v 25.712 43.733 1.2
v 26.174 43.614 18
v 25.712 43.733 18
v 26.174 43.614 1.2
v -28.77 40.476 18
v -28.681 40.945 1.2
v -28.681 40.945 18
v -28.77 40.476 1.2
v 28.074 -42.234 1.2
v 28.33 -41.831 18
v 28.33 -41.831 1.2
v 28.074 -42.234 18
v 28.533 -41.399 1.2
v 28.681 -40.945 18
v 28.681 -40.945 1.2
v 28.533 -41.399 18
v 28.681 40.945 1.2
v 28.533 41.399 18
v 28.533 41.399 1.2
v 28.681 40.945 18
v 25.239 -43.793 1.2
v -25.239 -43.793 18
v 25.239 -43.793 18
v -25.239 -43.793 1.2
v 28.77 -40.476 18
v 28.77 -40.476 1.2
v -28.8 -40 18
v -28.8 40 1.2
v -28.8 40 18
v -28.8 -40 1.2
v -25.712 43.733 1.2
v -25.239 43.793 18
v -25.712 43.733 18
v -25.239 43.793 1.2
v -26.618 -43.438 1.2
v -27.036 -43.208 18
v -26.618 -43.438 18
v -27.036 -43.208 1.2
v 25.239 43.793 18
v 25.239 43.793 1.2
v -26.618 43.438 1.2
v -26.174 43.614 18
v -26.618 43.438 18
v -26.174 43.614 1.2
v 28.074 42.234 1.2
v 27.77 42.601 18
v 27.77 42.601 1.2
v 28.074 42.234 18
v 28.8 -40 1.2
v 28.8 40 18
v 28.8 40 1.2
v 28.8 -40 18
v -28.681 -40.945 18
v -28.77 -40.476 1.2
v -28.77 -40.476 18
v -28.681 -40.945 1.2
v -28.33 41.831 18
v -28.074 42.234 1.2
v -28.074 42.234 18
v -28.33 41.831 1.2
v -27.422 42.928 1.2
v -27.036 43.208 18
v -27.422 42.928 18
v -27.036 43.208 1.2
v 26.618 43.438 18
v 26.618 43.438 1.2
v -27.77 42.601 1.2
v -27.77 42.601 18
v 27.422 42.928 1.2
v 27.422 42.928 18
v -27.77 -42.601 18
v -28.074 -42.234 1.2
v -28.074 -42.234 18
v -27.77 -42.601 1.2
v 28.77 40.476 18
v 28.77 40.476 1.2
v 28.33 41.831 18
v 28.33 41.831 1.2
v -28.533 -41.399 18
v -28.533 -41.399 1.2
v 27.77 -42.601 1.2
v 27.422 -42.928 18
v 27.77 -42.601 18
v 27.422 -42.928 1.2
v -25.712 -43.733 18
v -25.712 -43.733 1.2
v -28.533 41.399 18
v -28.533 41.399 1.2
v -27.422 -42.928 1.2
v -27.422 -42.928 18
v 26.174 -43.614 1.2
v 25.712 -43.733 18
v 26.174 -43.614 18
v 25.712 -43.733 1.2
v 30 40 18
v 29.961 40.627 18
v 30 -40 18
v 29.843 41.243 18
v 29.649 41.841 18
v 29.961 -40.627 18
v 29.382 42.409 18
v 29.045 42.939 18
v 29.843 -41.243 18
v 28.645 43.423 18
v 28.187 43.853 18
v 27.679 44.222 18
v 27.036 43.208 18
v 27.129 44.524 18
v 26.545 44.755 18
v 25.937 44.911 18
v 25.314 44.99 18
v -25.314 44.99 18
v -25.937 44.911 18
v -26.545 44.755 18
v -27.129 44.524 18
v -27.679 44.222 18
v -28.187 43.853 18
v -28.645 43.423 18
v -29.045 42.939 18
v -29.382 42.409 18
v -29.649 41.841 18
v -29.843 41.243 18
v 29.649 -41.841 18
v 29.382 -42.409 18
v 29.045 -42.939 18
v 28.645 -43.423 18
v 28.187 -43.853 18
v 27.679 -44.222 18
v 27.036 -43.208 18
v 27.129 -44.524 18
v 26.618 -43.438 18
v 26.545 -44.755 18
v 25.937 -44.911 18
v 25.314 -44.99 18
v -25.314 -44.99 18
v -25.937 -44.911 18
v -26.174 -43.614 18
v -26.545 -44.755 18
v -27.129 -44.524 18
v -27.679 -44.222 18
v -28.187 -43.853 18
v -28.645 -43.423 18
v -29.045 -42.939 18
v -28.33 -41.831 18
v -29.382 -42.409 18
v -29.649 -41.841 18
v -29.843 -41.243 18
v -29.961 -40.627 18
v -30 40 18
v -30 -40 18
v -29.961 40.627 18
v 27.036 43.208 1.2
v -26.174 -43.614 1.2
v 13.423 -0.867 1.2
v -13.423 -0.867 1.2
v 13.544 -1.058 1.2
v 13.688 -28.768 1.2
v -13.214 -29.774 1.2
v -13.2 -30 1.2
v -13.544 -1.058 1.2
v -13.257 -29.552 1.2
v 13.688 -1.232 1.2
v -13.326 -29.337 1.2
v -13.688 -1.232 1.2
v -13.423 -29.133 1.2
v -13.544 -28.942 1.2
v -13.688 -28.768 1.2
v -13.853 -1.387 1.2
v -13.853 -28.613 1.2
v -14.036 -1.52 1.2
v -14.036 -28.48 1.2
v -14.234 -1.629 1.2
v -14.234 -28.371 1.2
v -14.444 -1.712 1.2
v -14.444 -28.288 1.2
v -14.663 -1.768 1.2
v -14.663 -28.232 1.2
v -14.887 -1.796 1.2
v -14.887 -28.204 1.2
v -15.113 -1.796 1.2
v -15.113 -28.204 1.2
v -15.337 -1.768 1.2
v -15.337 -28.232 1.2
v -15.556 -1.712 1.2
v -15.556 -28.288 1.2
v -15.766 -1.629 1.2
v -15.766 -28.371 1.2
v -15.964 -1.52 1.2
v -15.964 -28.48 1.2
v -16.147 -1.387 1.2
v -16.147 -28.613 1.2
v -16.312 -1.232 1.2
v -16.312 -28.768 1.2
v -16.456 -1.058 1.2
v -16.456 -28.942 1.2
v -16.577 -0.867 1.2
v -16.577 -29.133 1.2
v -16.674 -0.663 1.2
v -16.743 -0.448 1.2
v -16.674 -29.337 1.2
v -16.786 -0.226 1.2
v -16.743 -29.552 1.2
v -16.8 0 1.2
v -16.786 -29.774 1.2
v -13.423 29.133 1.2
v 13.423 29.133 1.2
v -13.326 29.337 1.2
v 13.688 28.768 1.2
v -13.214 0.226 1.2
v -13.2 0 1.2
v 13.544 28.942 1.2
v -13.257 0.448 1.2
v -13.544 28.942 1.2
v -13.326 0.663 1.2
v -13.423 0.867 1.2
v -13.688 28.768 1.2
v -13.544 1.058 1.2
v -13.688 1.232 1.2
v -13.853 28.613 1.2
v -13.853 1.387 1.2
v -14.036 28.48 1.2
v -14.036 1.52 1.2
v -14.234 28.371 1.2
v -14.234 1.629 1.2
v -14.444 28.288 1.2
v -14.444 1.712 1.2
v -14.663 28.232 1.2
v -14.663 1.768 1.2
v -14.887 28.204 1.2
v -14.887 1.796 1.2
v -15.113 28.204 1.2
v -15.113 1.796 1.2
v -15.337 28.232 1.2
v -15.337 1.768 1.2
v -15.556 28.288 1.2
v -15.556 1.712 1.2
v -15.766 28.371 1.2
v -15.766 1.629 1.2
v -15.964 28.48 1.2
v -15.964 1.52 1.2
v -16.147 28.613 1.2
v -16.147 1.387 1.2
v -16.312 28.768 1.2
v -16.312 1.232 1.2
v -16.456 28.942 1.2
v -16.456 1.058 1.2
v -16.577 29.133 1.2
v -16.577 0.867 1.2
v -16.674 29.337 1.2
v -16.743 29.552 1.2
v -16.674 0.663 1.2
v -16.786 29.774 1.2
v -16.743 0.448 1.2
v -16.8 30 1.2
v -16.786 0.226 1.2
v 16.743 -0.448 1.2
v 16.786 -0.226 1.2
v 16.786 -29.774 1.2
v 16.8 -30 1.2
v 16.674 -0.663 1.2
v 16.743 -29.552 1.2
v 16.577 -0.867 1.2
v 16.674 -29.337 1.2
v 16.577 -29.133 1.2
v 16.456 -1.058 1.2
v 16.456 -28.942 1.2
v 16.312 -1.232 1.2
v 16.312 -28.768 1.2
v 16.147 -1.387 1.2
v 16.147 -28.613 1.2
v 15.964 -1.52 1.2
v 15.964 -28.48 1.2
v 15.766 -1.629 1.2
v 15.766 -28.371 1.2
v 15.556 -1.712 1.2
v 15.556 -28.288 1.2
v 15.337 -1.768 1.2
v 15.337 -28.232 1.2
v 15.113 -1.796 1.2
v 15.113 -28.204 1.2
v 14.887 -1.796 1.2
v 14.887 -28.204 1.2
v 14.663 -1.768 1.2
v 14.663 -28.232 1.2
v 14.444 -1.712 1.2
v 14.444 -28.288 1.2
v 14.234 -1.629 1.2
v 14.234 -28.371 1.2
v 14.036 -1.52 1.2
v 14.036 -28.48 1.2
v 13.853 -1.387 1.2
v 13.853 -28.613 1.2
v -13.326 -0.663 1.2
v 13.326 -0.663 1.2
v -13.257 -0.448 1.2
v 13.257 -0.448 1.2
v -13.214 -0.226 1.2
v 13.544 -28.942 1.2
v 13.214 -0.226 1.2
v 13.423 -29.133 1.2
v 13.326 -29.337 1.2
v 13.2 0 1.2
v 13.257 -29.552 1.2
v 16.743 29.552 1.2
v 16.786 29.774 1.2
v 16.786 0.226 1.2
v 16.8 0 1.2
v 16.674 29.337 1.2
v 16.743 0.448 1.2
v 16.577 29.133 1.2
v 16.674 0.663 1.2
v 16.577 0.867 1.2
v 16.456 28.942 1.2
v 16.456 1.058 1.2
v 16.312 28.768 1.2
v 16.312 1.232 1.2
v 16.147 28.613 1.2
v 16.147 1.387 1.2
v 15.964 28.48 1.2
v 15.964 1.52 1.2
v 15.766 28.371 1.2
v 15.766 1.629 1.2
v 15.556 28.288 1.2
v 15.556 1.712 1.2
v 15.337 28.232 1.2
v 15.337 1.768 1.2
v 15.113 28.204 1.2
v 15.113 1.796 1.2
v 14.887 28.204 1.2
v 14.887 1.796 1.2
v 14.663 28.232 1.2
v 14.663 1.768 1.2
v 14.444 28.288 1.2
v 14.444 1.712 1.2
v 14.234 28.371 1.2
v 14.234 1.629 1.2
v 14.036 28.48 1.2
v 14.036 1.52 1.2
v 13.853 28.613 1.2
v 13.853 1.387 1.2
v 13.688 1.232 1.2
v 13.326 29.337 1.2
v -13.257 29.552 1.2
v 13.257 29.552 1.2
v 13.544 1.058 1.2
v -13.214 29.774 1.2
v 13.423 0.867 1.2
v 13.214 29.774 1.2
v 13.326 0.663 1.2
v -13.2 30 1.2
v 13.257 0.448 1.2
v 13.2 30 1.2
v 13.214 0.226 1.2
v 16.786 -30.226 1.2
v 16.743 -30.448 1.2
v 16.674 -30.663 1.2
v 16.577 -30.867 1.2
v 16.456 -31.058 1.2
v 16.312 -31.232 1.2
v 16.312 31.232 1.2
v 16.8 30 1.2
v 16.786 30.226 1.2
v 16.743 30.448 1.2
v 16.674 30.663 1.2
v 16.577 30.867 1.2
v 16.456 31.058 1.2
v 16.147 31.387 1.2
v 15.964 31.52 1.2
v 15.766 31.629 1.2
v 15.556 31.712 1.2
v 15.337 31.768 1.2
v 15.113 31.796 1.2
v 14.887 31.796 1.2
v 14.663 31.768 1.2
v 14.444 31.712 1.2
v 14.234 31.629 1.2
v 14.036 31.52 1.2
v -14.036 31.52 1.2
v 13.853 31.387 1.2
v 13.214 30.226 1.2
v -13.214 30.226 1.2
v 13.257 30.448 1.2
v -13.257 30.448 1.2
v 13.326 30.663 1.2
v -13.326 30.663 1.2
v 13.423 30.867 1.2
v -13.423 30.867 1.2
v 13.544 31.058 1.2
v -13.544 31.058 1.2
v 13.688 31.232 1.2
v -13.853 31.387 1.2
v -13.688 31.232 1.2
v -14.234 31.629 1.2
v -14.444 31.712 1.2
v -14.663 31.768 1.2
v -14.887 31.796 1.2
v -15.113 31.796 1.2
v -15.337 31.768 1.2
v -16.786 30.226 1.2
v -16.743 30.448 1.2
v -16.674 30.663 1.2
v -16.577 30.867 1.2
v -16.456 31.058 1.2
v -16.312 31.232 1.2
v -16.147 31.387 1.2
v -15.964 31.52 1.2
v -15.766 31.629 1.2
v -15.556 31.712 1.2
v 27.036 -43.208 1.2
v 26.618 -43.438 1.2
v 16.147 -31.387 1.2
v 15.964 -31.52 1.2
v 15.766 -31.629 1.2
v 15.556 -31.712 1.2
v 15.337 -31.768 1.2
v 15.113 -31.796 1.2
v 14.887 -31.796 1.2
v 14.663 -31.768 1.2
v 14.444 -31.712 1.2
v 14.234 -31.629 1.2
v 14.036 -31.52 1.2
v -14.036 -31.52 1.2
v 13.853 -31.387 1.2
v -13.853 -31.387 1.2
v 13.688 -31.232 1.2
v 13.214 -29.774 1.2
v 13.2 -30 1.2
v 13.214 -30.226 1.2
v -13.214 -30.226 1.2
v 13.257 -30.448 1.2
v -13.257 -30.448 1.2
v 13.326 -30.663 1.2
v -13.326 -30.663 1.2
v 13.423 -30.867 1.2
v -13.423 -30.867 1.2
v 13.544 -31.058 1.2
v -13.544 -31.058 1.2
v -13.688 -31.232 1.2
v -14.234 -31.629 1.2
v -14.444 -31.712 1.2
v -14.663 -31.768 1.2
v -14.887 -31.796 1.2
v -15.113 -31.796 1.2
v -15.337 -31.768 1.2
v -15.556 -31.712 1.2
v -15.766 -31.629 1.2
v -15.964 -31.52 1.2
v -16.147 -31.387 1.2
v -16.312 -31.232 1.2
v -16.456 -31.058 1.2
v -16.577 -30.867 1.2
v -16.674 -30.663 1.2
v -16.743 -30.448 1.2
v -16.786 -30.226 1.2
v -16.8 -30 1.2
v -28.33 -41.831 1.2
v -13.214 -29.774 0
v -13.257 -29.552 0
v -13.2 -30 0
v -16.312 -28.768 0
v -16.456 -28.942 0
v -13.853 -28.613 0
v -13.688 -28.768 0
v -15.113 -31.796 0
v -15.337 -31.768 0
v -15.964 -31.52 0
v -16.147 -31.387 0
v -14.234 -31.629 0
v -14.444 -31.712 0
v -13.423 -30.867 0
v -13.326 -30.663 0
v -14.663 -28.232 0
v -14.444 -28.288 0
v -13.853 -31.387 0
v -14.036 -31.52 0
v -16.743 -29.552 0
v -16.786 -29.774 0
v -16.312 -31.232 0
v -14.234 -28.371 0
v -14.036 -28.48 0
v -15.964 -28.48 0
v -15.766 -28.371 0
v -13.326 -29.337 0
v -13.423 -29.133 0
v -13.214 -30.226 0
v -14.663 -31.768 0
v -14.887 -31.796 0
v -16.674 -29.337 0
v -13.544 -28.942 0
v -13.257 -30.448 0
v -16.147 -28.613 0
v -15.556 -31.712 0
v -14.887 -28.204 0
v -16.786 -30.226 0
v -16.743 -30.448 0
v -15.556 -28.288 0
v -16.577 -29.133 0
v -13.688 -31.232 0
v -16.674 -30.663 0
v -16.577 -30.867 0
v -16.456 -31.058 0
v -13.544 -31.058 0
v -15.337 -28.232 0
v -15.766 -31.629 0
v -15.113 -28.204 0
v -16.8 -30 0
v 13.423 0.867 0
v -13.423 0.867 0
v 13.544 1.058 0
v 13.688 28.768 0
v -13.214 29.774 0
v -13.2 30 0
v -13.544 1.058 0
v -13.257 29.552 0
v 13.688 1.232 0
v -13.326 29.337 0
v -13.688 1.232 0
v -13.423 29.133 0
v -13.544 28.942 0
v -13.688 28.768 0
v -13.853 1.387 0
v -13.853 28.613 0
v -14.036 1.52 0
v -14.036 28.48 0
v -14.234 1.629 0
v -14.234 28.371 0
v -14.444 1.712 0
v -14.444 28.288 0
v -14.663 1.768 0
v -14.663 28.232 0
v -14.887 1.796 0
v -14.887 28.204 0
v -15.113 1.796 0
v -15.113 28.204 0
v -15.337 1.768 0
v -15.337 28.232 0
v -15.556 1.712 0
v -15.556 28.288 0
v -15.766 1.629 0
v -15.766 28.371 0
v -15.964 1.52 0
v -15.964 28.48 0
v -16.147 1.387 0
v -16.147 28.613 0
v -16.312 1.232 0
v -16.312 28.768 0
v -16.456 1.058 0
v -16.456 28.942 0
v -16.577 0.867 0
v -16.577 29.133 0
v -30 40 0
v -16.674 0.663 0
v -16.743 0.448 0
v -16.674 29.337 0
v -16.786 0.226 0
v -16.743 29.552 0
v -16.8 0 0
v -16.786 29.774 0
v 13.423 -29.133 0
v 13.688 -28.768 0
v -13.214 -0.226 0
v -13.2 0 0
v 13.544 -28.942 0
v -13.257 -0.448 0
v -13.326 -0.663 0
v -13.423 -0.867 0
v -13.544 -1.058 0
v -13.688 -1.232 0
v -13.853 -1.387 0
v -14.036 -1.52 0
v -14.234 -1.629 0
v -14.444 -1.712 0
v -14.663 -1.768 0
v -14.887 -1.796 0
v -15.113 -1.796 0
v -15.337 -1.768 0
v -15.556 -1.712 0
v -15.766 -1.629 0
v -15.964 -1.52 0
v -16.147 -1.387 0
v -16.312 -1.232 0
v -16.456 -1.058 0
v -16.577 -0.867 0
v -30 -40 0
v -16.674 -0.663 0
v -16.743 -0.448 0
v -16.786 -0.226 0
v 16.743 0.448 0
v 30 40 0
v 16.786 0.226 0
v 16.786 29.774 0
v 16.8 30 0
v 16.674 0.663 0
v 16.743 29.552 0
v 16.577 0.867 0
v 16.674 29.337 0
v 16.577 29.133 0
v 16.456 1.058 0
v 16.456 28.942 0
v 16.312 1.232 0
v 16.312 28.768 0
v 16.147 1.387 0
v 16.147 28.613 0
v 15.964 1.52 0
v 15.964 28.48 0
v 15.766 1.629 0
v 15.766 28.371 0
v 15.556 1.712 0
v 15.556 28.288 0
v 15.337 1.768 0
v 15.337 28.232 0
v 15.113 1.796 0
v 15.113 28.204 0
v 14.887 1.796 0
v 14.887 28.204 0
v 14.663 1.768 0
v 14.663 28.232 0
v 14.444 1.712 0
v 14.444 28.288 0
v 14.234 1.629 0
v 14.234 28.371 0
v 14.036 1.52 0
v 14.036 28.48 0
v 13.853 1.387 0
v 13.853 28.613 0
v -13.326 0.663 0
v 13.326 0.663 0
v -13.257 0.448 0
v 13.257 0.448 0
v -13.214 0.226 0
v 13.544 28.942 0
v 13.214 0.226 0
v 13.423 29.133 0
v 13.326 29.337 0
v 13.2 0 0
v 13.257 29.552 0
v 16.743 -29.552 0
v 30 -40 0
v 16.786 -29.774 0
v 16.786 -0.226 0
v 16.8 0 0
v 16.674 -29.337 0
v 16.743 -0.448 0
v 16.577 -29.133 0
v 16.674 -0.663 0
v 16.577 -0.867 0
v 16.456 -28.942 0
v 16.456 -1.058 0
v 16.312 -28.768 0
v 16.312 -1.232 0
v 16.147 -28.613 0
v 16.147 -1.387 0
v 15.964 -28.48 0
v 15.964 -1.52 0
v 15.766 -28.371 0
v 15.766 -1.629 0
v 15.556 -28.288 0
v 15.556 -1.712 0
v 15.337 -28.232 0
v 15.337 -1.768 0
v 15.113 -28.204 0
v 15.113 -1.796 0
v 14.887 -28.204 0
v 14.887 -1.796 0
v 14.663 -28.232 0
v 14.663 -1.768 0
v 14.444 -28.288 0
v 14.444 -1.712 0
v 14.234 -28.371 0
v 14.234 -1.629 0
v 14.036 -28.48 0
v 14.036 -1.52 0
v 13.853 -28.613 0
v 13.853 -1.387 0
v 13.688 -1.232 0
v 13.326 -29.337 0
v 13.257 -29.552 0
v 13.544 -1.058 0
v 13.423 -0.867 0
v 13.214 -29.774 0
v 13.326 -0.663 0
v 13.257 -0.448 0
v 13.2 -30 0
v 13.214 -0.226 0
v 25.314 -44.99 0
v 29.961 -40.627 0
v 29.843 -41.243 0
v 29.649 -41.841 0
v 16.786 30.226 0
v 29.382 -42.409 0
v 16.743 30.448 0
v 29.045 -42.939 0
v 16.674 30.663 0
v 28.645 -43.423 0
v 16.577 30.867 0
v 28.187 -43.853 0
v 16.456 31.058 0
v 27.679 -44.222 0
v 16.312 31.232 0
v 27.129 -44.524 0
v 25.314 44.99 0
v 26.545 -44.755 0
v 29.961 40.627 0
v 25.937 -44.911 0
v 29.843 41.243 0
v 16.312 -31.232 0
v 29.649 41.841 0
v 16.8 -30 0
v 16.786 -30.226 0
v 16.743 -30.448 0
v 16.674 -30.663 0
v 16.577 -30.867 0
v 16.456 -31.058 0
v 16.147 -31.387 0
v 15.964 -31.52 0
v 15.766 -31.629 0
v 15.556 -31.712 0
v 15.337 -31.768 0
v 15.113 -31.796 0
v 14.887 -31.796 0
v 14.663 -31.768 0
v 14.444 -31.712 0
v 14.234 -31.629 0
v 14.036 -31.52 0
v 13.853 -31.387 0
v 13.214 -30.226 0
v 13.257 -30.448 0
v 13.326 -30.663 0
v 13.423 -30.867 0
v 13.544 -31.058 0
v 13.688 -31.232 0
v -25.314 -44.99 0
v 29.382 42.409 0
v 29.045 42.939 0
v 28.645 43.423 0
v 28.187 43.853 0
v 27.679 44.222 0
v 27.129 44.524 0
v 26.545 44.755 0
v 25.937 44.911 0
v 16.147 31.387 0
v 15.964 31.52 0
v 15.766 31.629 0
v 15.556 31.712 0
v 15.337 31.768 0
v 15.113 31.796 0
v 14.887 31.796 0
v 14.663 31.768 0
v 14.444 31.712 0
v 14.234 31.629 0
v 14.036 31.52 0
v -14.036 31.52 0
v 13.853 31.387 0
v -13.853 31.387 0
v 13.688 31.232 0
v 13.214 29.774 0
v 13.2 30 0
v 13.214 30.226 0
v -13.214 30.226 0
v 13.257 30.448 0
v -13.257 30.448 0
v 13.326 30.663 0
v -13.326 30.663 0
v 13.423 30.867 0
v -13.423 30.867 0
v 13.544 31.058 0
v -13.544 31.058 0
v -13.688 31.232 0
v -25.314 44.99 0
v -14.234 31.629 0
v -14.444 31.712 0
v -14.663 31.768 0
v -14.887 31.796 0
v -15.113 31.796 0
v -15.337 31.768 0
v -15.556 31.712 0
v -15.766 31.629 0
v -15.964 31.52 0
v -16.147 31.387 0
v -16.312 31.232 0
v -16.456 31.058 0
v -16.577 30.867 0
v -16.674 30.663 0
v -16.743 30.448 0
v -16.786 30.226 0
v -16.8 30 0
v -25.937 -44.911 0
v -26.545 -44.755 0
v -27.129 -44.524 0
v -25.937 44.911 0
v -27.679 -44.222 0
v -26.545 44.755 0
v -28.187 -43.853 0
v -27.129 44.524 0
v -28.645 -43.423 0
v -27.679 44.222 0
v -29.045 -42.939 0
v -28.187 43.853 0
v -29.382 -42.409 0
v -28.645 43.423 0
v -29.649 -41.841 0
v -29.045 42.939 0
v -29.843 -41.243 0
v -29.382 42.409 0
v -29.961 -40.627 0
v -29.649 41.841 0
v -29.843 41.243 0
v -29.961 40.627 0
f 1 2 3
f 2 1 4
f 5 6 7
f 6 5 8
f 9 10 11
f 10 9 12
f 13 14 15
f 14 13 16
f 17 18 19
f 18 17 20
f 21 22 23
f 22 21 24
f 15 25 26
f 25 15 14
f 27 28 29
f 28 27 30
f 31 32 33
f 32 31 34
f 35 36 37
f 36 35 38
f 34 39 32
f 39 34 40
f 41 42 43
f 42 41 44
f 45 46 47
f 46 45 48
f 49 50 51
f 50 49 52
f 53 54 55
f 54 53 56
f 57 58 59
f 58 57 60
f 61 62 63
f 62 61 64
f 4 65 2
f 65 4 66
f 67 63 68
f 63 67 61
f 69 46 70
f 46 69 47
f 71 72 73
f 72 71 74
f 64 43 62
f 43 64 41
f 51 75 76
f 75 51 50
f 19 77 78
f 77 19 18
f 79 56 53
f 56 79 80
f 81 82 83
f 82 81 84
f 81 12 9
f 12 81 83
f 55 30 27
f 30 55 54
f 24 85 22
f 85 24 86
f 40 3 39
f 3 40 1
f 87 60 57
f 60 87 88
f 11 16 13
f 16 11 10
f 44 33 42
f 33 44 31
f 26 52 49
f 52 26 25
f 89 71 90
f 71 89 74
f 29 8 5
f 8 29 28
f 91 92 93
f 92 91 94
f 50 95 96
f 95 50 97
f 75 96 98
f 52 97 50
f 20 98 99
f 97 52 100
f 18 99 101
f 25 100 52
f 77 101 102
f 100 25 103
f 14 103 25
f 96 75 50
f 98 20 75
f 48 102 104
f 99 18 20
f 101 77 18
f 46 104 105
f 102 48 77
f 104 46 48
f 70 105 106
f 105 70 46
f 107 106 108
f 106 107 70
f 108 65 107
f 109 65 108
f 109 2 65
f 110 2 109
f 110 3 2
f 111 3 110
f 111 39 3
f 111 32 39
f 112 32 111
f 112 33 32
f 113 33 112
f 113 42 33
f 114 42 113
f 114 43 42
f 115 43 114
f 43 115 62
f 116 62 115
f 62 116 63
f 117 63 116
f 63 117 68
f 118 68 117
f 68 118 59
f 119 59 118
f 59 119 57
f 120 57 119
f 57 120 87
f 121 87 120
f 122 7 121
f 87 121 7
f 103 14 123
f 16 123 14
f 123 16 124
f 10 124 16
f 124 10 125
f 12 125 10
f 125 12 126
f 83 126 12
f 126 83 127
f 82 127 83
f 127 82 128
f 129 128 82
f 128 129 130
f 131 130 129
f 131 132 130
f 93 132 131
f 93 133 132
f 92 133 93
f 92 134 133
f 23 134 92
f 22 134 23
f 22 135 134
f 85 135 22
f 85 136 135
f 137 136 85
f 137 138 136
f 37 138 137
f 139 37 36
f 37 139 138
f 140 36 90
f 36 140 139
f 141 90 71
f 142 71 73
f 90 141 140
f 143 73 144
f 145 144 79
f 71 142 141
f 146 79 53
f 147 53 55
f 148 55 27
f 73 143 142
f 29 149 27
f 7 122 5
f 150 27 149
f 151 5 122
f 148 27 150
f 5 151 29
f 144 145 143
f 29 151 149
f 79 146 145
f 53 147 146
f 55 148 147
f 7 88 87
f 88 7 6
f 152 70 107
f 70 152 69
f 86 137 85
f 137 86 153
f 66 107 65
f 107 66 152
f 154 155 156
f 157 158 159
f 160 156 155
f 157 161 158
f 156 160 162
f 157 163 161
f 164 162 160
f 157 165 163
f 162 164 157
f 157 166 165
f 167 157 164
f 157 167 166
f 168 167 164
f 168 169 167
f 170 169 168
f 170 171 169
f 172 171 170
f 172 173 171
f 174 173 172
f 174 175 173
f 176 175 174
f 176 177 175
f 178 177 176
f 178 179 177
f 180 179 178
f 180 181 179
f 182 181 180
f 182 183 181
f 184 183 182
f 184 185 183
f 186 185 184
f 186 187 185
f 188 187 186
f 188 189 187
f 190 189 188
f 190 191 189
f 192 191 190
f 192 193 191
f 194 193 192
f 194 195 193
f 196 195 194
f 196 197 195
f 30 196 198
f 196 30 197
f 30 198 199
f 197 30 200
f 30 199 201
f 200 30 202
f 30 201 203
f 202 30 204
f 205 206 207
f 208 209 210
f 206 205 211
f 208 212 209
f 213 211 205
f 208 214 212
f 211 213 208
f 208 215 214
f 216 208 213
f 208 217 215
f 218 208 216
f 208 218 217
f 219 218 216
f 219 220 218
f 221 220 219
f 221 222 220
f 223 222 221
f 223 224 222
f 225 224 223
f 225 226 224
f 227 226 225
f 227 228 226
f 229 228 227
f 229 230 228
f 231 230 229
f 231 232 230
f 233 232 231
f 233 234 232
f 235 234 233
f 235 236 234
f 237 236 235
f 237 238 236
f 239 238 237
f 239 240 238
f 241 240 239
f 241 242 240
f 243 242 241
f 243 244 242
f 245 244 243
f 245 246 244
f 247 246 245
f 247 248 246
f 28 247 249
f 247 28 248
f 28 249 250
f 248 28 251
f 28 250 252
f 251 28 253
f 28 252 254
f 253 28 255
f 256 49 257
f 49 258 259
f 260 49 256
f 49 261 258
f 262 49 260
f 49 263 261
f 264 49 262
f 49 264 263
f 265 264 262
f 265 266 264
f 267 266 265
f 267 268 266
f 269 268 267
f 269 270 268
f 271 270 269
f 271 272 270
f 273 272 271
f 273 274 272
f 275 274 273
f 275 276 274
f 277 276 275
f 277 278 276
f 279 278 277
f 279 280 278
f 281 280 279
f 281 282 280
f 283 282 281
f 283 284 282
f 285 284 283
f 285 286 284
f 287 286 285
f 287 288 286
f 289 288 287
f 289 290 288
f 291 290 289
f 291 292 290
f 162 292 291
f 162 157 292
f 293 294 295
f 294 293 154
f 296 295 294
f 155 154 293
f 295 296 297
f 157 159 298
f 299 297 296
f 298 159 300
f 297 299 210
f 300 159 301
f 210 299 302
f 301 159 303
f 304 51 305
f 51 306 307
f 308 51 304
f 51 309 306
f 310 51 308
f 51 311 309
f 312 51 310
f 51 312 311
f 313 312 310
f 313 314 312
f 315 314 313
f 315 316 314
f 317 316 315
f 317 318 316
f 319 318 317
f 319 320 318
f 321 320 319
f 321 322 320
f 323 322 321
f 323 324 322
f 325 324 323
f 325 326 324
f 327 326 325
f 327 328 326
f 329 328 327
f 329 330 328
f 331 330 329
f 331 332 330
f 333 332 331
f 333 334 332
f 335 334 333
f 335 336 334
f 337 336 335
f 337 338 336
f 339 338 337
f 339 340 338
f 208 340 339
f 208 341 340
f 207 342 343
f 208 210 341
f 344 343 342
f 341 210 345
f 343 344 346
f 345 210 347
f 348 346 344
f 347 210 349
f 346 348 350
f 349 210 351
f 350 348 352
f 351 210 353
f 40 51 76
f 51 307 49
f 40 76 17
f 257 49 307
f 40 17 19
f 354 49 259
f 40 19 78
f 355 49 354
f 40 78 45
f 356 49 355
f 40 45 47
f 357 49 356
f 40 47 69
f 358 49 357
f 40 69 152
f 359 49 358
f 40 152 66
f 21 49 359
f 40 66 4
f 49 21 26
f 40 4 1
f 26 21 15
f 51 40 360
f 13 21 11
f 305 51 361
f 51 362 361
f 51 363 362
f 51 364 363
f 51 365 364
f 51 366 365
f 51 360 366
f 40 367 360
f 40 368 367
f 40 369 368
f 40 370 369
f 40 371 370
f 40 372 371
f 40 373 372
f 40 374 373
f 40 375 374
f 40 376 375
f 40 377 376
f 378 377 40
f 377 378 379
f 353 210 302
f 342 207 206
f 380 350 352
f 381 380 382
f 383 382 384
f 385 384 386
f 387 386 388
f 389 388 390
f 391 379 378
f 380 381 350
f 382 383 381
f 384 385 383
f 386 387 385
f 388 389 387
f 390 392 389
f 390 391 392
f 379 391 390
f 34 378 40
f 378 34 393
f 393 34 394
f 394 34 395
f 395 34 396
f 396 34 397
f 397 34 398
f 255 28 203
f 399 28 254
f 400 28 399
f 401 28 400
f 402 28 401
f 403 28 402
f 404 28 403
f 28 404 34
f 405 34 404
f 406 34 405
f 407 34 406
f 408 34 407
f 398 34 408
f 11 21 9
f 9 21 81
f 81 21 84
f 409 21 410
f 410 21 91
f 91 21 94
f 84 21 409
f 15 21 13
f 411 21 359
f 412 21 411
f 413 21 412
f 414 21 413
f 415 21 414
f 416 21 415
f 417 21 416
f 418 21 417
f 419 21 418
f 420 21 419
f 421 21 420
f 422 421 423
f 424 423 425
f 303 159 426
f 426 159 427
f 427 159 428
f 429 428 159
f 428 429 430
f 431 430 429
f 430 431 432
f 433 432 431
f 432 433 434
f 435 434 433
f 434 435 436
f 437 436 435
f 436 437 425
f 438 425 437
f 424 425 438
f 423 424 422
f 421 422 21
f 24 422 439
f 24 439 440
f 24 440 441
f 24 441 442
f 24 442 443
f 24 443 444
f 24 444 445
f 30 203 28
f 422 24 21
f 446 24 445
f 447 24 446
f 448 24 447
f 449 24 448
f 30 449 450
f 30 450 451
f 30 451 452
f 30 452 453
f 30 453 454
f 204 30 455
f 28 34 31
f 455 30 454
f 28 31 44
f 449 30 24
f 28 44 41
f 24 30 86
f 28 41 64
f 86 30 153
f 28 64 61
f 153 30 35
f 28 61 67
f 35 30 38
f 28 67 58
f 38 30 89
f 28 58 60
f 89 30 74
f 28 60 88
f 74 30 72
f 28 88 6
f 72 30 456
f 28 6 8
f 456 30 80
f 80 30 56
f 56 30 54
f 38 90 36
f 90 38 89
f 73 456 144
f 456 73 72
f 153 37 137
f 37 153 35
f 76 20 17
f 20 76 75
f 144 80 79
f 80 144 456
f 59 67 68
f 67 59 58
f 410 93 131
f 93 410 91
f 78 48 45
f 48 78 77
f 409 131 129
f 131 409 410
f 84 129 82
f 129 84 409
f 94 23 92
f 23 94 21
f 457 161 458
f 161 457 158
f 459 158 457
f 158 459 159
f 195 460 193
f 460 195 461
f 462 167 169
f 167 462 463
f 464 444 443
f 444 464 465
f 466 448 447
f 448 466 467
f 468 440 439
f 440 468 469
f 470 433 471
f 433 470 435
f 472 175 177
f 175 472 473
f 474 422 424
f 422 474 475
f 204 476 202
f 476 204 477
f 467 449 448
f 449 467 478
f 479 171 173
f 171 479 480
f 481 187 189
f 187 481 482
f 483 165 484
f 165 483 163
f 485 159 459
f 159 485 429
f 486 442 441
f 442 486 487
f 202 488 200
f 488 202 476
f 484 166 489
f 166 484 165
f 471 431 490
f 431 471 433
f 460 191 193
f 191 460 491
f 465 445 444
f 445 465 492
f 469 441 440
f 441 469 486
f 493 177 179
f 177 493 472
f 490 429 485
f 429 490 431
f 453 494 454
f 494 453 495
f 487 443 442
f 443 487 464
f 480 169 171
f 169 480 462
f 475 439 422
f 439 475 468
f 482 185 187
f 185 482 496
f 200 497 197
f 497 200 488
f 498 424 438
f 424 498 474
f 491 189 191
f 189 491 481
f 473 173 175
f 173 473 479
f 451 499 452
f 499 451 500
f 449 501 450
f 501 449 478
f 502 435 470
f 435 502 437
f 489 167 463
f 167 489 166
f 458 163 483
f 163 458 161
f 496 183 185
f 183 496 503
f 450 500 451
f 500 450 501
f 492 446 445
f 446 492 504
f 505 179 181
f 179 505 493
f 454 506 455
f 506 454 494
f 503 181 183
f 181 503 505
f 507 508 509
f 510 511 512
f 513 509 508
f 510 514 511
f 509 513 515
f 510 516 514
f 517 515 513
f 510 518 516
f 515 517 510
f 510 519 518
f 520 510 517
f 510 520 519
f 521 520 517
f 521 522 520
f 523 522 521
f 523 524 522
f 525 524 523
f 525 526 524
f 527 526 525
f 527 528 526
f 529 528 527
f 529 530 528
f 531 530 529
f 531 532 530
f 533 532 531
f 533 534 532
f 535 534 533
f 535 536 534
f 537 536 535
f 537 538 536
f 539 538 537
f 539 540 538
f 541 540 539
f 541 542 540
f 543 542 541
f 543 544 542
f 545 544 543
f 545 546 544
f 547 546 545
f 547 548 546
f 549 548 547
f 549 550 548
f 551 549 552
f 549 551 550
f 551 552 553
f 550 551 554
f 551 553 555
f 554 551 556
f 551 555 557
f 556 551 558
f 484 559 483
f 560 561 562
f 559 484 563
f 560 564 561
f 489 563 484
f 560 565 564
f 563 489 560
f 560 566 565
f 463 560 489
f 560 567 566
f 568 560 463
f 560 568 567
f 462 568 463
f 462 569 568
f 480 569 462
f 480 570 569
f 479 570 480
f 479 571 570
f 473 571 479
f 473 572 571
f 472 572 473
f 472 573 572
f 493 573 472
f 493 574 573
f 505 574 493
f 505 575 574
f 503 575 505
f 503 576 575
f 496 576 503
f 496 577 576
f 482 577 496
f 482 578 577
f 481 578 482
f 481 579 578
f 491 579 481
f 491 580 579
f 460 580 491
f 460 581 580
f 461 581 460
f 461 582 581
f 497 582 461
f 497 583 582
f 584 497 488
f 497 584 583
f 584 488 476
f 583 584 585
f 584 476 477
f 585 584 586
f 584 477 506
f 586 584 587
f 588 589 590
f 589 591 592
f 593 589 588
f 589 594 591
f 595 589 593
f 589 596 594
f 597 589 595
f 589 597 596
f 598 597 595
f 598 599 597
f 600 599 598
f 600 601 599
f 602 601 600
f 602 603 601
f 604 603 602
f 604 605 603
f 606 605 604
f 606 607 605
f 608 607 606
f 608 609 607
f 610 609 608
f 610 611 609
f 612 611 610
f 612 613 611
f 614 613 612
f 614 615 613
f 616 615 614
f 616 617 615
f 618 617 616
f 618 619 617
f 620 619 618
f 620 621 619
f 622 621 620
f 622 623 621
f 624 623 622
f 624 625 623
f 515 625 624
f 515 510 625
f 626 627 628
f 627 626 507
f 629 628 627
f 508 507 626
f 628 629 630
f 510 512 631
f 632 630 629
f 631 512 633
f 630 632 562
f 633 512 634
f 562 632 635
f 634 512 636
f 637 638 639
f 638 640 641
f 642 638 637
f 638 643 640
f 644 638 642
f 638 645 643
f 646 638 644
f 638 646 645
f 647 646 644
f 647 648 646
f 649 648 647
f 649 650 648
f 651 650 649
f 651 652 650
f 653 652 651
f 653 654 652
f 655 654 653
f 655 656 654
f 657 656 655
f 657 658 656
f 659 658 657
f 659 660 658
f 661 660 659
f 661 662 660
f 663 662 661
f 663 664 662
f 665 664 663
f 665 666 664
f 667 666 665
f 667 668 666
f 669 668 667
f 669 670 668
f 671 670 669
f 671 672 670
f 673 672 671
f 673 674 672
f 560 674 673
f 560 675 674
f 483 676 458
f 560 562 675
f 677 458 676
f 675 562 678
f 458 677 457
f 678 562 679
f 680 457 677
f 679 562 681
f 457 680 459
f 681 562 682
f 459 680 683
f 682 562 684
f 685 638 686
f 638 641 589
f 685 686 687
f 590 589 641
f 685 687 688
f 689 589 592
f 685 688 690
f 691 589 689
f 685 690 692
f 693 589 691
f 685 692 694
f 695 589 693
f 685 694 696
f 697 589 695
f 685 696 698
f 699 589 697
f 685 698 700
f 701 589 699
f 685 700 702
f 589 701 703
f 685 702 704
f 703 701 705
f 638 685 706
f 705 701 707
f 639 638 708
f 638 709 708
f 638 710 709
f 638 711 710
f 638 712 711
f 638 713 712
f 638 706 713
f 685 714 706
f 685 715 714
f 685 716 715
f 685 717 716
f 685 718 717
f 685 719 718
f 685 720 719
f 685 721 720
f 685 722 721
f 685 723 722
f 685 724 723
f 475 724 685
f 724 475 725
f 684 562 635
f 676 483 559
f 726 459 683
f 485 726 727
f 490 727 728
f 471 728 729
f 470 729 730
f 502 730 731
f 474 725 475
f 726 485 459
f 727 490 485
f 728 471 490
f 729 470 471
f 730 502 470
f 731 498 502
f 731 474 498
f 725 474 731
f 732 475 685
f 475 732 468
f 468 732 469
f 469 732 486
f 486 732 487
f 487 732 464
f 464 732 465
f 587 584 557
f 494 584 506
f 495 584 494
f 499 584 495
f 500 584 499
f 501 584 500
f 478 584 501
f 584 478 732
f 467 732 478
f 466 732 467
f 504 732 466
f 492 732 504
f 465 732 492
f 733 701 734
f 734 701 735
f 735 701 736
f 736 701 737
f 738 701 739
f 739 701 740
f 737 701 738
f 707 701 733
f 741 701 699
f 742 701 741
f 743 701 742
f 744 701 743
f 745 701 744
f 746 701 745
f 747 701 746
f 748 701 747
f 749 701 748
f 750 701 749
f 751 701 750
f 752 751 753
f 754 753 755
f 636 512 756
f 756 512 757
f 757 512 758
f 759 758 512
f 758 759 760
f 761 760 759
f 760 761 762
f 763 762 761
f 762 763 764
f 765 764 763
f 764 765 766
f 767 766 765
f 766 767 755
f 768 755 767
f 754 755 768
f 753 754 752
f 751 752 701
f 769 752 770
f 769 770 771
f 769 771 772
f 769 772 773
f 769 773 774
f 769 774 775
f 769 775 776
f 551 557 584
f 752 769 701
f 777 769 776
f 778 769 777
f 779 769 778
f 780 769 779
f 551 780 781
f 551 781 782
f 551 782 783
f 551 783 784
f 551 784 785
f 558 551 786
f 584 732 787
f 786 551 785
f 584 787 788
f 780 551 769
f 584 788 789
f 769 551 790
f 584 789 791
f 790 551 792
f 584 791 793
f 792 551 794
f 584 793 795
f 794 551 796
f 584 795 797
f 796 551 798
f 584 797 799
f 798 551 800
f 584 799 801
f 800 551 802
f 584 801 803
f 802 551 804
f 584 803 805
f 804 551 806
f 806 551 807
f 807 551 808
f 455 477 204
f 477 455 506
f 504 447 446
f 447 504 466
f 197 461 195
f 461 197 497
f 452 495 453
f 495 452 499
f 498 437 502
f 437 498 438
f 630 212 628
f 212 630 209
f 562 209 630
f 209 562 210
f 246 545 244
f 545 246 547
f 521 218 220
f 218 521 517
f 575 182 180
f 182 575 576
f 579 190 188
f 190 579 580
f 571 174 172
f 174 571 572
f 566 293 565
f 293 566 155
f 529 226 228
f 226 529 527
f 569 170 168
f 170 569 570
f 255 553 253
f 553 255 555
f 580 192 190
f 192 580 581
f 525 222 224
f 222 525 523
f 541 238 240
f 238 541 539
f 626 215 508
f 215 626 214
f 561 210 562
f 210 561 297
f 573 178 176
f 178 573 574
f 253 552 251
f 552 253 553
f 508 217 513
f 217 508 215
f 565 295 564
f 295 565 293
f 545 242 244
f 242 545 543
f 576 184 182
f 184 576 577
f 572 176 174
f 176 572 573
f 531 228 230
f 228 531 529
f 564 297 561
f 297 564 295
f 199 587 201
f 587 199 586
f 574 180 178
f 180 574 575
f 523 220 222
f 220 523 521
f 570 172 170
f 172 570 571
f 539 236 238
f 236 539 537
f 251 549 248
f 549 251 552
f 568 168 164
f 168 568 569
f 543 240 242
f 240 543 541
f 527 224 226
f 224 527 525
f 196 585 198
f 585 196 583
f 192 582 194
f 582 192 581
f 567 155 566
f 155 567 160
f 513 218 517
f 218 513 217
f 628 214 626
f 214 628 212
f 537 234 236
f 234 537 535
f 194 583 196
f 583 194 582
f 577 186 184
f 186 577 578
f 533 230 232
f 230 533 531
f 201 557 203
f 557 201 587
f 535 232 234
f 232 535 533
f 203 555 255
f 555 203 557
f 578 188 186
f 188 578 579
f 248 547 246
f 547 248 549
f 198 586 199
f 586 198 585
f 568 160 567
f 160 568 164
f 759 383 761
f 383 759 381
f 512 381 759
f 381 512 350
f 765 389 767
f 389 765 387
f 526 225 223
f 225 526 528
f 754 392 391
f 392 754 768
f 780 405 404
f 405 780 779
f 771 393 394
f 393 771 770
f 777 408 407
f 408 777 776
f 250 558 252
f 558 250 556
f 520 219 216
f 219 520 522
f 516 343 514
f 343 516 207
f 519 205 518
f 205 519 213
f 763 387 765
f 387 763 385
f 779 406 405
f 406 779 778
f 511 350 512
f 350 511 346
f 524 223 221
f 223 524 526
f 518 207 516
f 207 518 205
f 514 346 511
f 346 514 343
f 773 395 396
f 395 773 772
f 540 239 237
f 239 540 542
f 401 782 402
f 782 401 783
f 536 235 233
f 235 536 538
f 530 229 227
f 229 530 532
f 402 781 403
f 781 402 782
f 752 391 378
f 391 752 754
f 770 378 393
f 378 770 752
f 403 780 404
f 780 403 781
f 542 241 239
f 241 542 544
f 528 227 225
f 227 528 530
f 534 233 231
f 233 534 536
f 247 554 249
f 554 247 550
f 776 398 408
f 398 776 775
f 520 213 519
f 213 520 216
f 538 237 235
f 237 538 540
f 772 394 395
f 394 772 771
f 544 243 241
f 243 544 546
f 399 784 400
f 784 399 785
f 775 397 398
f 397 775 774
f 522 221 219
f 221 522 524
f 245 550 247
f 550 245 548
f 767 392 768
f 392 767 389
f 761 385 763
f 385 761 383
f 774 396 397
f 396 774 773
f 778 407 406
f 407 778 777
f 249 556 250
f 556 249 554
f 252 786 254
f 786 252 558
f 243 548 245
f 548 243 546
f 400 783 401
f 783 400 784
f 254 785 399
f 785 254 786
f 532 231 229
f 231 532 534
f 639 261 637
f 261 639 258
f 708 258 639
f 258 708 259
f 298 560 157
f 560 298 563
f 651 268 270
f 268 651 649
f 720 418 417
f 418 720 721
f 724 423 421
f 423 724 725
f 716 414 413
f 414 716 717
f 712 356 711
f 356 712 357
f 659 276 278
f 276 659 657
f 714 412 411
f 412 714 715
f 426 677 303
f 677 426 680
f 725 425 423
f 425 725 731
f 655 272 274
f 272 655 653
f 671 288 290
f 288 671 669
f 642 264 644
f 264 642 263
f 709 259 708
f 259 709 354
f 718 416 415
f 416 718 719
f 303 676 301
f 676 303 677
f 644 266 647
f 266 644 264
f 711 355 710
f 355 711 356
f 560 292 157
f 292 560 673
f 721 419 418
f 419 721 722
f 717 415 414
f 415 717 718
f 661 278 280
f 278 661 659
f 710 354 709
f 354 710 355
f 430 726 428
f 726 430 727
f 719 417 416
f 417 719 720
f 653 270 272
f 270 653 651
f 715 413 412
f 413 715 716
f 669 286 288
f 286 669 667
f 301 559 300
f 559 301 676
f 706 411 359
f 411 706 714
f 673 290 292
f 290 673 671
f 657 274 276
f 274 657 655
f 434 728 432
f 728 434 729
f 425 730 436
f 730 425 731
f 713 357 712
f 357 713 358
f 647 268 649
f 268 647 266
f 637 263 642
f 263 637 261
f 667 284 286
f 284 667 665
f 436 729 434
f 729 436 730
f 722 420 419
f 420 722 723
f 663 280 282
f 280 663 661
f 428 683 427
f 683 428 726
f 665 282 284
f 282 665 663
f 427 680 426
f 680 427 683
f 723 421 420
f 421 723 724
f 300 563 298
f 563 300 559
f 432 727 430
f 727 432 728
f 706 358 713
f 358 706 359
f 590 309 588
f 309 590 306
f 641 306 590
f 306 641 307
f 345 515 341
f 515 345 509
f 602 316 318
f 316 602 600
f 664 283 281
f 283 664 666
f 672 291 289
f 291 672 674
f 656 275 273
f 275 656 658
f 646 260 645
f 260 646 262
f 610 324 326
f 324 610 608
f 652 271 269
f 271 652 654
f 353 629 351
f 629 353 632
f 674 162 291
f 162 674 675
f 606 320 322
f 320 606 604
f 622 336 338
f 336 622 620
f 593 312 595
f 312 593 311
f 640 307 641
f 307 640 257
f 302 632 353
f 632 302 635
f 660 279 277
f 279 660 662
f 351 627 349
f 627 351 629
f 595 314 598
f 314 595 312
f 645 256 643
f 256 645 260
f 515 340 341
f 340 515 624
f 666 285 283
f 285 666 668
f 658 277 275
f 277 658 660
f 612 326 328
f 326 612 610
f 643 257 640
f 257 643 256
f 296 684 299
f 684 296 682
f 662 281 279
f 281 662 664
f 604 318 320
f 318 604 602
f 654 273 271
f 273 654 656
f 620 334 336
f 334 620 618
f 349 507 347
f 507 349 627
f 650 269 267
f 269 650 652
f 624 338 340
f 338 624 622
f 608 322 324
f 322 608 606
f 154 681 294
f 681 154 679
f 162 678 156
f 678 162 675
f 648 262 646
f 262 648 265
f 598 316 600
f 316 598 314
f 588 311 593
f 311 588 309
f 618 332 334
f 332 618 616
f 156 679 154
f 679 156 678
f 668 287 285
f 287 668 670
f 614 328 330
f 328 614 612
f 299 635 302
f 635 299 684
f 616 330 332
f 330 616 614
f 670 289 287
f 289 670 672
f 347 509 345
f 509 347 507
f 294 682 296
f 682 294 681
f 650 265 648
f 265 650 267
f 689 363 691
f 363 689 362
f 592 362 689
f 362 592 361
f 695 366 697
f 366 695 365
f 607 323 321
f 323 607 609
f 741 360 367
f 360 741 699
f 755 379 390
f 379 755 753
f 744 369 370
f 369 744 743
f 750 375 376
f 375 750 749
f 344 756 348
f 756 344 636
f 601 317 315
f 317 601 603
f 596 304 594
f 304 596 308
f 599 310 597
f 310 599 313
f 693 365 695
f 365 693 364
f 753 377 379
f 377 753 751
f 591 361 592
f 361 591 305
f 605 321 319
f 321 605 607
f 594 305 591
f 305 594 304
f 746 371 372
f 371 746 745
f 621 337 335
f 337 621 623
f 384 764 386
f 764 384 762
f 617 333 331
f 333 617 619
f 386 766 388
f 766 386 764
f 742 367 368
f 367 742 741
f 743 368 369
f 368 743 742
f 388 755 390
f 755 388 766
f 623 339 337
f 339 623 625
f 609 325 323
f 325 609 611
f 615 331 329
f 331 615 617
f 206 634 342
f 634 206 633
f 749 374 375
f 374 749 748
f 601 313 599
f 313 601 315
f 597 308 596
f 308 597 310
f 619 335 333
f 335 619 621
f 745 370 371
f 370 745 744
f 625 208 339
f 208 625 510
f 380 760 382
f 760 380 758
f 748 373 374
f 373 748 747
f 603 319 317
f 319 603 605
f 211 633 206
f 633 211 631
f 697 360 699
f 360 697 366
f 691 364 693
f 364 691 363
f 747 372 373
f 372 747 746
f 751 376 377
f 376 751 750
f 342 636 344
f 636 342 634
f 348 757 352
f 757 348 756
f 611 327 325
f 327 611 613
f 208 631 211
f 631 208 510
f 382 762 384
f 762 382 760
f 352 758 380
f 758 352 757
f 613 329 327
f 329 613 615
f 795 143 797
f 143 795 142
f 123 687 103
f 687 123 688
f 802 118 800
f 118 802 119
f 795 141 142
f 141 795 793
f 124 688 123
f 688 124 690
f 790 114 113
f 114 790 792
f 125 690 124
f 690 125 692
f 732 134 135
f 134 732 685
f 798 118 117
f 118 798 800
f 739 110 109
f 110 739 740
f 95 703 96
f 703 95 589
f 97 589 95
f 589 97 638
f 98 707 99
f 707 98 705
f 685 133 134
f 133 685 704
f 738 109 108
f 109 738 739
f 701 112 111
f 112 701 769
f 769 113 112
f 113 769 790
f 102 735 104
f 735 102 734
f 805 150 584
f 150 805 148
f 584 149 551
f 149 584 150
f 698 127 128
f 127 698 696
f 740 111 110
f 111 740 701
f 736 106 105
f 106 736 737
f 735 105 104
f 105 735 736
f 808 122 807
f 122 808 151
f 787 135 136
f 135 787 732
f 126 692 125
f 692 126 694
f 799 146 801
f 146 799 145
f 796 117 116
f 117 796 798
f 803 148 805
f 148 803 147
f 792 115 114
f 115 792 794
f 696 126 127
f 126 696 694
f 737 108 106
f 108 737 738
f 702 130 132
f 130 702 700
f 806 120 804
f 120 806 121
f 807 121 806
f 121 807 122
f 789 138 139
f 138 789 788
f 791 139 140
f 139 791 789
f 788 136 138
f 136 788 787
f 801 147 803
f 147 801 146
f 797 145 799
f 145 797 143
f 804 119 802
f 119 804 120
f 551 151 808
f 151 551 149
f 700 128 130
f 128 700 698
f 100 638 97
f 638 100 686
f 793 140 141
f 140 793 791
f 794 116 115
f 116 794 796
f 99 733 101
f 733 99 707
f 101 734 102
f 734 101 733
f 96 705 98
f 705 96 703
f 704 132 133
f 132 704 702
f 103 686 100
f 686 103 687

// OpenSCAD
$fn = 50;


difference() {
	union() {
		hull() {
			translate(v = [-25.0000000000, 40.0000000000, 0]) {
				cylinder(h = 18, r = 5);
			}
			translate(v = [25.0000000000, 40.0000000000, 0]) {
				cylinder(h = 18, r = 5);
			}
			translate(v = [-25.0000000000, -40.0000000000, 0]) {
				cylinder(h = 18, r = 5);
			}
			translate(v = [25.0000000000, -40.0000000000, 0]) {
				cylinder(h = 18, r = 5);
			}
		}
	}
	union() {
		translate(v = [0, 0, 1.2000000000]) {
			hull() {
				translate(v = [-25.0000000000, 40.0000000000, 0]) {
					cylinder(h = 16.8000000000, r = 3.8000000000);
				}
				translate(v = [25.0000000000, 40.0000000000, 0]) {
					cylinder(h = 16.8000000000, r = 3.8000000000);
				}
				translate(v = [-25.0000000000, -40.0000000000, 0]) {
					cylinder(h = 16.8000000000, r = 3.8000000000);
				}
				translate(v = [25.0000000000, -40.0000000000, 0]) {
					cylinder(h = 16.8000000000, r = 3.8000000000);
				}
			}
		}
		#translate(v = [-15.0000000000, -30.0000000000, 0]) {
			cylinder(h = 1.2000000000, r = 1.8000000000);
		}
		#translate(v = [-15.0000000000, 0.0000000000, 0]) {
			cylinder(h = 1.2000000000, r = 1.8000000000);
		}
		#translate(v = [-15.0000000000, 30.0000000000, 0]) {
			cylinder(h = 1.2000000000, r = 1.8000000000);
		}
		#translate(v = [15.0000000000, -30.0000000000, 0]) {
			cylinder(h = 1.2000000000, r = 1.8000000000);
		}
		#translate(v = [15.0000000000, 0.0000000000, 0]) {
			cylinder(h = 1.2000000000, r = 1.8000000000);
		}
		#translate(v = [15.0000000000, 30.0000000000, 0]) {
			cylinder(h = 1.2000000000, r = 1.8000000000);
		}
	}
}
